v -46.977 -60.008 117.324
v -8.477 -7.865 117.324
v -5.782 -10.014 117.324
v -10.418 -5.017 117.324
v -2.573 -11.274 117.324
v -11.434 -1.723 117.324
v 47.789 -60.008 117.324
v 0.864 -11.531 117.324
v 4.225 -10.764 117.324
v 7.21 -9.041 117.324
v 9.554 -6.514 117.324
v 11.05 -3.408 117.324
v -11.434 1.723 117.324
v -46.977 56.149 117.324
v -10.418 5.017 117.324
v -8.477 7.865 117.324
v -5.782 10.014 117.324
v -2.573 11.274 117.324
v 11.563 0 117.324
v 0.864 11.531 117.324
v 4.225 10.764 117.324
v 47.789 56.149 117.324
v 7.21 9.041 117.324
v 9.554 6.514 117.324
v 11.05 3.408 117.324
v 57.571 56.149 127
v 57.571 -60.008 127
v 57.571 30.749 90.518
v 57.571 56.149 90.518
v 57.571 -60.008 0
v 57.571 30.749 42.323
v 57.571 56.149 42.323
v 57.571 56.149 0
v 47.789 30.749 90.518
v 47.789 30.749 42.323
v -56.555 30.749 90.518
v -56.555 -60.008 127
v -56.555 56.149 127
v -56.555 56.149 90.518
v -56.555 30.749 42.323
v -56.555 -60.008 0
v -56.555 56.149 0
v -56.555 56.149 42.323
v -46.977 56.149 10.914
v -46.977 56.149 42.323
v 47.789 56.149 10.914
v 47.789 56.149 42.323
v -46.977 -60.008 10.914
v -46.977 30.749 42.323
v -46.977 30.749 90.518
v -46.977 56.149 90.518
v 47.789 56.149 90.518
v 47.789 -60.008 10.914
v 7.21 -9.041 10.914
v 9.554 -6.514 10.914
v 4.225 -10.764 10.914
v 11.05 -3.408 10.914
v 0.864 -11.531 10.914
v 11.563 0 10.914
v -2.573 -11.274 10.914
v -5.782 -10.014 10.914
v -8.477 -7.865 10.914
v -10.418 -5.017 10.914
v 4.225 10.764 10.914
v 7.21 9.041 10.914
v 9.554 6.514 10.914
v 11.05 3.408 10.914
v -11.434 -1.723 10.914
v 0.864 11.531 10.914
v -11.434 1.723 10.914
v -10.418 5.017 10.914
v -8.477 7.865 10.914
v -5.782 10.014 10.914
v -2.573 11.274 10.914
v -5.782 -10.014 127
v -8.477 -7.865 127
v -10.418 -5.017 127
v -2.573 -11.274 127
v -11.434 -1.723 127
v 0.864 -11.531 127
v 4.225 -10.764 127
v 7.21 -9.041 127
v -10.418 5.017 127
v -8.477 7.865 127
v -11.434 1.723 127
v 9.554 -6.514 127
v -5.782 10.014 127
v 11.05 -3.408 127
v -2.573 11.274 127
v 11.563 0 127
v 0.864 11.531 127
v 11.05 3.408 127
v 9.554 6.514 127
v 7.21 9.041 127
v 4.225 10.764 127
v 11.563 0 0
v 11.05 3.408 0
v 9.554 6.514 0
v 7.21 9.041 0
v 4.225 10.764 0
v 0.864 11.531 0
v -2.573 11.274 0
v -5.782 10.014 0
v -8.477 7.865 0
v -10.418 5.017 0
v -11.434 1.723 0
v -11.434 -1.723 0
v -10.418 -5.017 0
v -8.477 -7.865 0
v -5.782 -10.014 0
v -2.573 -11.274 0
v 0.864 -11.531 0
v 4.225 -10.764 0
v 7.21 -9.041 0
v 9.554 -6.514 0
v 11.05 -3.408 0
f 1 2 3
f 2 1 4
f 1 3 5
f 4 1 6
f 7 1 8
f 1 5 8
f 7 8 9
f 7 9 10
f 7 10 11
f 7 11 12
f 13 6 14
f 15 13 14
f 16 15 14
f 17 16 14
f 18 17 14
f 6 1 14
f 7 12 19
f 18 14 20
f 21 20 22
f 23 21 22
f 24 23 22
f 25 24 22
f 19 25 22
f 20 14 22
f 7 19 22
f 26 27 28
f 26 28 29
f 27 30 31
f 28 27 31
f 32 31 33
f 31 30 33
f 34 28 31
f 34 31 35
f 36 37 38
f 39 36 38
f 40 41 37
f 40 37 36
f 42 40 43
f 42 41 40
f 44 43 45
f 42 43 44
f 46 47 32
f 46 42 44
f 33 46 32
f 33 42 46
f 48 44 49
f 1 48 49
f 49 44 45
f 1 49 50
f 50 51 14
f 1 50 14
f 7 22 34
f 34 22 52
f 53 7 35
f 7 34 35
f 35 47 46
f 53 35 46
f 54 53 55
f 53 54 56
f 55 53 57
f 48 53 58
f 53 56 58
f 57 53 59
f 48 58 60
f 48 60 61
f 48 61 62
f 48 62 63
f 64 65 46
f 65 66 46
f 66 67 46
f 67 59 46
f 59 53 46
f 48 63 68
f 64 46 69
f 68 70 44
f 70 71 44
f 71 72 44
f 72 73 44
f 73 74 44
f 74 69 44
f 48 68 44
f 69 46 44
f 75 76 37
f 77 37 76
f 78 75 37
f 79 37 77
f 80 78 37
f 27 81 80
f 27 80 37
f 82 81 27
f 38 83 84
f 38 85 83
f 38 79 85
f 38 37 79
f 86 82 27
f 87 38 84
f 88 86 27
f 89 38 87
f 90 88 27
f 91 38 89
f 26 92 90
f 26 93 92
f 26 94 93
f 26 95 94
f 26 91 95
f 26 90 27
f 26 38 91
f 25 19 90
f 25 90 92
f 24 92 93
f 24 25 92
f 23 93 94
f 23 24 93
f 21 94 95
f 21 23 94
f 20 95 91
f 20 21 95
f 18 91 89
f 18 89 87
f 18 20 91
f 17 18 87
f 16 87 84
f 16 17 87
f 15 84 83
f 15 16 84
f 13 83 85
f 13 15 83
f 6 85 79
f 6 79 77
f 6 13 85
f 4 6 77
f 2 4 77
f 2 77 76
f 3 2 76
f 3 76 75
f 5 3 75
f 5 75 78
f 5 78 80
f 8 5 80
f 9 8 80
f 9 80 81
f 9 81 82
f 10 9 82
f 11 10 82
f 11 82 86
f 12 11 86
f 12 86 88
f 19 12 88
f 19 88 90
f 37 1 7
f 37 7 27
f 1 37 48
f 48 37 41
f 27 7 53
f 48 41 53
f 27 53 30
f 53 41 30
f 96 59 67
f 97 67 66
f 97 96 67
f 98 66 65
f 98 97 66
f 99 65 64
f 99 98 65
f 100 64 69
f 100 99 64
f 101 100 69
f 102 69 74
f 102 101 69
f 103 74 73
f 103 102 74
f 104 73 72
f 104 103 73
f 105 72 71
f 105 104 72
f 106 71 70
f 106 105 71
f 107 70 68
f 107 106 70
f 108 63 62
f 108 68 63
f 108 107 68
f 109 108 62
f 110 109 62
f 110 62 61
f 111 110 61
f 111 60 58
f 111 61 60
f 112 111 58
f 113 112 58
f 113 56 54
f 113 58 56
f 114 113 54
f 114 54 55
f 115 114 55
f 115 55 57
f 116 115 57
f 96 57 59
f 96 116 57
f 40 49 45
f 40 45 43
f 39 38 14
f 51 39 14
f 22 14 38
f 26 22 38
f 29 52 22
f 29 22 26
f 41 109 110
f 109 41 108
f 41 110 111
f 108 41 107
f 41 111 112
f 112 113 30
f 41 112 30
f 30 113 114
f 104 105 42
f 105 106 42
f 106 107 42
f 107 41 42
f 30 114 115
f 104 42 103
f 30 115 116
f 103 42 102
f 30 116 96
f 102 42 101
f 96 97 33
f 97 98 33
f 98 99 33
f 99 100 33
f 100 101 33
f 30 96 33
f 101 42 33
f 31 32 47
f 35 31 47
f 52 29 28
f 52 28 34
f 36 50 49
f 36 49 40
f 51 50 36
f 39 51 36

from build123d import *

# Parameters (mm, degrees)
F0_W     = 114.1259372234
F0_H     = 116.1566488445
F0_R     = 11.5634677864
F1_DEPTH = 127
F3_DEPTH = 2514.6
F2_W     = 9.7812525928
F2_H     = 48.1955334544
F4_DEPTH = 25.4
F2_W_2   = 9.5781907439
F5_DEPTH = 25.4


with BuildPart() as f1:
    # F0 (on Top) → F1 (new body)
    with BuildSketch(Plane.XY):
        with Locations((0.5076751113, -1.9291769713)):
            Rectangle(F0_W, F0_H)
        Circle(F0_R, mode=Mode.SUBTRACT)
    extrude(amount=F1_DEPTH)

    # F2 (on face) → F3 (cut)
    with BuildSketch(Plane(origin=(0, 56.1491474509, 0), x_dir=(-1, 0, 0), z_dir=(0, 1, 0))):
        Polygon((46.9771027565, 117.3235103488), (-47.7893911302, 117.3235103488), (-47.7893911302, 90.5181244016), (-47.7893911302, 42.3225909472), (-47.7893911302, 10.9142651781), (46.9771027565, 10.9142651781), (46.9771027565, 42.3225909472), (46.9771027565, 90.5181244016), align=None)
    extrude(amount=-F3_DEPTH, mode=Mode.SUBTRACT)

    # F2 (on face) → F4 (cut)
    with BuildSketch(Plane(origin=(0, 56.1491474509, 0), x_dir=(-1, 0, 0), z_dir=(0, 1, 0))):
        with Locations((-52.6800174266, 66.4203576744)):
            Rectangle(F2_W, F2_H)
    extrude(amount=-F4_DEPTH, mode=Mode.SUBTRACT)

    # F2 (on face) → F5 (cut)
    with BuildSketch(Plane(origin=(0, 56.1491474509, 0), x_dir=(-1, 0, 0), z_dir=(0, 1, 0))):
        with Locations((51.7661981285, 66.4203576744)):
            Rectangle(F2_W_2, F2_H)
    extrude(amount=-F5_DEPTH, mode=Mode.SUBTRACT)


solid = f1.part
